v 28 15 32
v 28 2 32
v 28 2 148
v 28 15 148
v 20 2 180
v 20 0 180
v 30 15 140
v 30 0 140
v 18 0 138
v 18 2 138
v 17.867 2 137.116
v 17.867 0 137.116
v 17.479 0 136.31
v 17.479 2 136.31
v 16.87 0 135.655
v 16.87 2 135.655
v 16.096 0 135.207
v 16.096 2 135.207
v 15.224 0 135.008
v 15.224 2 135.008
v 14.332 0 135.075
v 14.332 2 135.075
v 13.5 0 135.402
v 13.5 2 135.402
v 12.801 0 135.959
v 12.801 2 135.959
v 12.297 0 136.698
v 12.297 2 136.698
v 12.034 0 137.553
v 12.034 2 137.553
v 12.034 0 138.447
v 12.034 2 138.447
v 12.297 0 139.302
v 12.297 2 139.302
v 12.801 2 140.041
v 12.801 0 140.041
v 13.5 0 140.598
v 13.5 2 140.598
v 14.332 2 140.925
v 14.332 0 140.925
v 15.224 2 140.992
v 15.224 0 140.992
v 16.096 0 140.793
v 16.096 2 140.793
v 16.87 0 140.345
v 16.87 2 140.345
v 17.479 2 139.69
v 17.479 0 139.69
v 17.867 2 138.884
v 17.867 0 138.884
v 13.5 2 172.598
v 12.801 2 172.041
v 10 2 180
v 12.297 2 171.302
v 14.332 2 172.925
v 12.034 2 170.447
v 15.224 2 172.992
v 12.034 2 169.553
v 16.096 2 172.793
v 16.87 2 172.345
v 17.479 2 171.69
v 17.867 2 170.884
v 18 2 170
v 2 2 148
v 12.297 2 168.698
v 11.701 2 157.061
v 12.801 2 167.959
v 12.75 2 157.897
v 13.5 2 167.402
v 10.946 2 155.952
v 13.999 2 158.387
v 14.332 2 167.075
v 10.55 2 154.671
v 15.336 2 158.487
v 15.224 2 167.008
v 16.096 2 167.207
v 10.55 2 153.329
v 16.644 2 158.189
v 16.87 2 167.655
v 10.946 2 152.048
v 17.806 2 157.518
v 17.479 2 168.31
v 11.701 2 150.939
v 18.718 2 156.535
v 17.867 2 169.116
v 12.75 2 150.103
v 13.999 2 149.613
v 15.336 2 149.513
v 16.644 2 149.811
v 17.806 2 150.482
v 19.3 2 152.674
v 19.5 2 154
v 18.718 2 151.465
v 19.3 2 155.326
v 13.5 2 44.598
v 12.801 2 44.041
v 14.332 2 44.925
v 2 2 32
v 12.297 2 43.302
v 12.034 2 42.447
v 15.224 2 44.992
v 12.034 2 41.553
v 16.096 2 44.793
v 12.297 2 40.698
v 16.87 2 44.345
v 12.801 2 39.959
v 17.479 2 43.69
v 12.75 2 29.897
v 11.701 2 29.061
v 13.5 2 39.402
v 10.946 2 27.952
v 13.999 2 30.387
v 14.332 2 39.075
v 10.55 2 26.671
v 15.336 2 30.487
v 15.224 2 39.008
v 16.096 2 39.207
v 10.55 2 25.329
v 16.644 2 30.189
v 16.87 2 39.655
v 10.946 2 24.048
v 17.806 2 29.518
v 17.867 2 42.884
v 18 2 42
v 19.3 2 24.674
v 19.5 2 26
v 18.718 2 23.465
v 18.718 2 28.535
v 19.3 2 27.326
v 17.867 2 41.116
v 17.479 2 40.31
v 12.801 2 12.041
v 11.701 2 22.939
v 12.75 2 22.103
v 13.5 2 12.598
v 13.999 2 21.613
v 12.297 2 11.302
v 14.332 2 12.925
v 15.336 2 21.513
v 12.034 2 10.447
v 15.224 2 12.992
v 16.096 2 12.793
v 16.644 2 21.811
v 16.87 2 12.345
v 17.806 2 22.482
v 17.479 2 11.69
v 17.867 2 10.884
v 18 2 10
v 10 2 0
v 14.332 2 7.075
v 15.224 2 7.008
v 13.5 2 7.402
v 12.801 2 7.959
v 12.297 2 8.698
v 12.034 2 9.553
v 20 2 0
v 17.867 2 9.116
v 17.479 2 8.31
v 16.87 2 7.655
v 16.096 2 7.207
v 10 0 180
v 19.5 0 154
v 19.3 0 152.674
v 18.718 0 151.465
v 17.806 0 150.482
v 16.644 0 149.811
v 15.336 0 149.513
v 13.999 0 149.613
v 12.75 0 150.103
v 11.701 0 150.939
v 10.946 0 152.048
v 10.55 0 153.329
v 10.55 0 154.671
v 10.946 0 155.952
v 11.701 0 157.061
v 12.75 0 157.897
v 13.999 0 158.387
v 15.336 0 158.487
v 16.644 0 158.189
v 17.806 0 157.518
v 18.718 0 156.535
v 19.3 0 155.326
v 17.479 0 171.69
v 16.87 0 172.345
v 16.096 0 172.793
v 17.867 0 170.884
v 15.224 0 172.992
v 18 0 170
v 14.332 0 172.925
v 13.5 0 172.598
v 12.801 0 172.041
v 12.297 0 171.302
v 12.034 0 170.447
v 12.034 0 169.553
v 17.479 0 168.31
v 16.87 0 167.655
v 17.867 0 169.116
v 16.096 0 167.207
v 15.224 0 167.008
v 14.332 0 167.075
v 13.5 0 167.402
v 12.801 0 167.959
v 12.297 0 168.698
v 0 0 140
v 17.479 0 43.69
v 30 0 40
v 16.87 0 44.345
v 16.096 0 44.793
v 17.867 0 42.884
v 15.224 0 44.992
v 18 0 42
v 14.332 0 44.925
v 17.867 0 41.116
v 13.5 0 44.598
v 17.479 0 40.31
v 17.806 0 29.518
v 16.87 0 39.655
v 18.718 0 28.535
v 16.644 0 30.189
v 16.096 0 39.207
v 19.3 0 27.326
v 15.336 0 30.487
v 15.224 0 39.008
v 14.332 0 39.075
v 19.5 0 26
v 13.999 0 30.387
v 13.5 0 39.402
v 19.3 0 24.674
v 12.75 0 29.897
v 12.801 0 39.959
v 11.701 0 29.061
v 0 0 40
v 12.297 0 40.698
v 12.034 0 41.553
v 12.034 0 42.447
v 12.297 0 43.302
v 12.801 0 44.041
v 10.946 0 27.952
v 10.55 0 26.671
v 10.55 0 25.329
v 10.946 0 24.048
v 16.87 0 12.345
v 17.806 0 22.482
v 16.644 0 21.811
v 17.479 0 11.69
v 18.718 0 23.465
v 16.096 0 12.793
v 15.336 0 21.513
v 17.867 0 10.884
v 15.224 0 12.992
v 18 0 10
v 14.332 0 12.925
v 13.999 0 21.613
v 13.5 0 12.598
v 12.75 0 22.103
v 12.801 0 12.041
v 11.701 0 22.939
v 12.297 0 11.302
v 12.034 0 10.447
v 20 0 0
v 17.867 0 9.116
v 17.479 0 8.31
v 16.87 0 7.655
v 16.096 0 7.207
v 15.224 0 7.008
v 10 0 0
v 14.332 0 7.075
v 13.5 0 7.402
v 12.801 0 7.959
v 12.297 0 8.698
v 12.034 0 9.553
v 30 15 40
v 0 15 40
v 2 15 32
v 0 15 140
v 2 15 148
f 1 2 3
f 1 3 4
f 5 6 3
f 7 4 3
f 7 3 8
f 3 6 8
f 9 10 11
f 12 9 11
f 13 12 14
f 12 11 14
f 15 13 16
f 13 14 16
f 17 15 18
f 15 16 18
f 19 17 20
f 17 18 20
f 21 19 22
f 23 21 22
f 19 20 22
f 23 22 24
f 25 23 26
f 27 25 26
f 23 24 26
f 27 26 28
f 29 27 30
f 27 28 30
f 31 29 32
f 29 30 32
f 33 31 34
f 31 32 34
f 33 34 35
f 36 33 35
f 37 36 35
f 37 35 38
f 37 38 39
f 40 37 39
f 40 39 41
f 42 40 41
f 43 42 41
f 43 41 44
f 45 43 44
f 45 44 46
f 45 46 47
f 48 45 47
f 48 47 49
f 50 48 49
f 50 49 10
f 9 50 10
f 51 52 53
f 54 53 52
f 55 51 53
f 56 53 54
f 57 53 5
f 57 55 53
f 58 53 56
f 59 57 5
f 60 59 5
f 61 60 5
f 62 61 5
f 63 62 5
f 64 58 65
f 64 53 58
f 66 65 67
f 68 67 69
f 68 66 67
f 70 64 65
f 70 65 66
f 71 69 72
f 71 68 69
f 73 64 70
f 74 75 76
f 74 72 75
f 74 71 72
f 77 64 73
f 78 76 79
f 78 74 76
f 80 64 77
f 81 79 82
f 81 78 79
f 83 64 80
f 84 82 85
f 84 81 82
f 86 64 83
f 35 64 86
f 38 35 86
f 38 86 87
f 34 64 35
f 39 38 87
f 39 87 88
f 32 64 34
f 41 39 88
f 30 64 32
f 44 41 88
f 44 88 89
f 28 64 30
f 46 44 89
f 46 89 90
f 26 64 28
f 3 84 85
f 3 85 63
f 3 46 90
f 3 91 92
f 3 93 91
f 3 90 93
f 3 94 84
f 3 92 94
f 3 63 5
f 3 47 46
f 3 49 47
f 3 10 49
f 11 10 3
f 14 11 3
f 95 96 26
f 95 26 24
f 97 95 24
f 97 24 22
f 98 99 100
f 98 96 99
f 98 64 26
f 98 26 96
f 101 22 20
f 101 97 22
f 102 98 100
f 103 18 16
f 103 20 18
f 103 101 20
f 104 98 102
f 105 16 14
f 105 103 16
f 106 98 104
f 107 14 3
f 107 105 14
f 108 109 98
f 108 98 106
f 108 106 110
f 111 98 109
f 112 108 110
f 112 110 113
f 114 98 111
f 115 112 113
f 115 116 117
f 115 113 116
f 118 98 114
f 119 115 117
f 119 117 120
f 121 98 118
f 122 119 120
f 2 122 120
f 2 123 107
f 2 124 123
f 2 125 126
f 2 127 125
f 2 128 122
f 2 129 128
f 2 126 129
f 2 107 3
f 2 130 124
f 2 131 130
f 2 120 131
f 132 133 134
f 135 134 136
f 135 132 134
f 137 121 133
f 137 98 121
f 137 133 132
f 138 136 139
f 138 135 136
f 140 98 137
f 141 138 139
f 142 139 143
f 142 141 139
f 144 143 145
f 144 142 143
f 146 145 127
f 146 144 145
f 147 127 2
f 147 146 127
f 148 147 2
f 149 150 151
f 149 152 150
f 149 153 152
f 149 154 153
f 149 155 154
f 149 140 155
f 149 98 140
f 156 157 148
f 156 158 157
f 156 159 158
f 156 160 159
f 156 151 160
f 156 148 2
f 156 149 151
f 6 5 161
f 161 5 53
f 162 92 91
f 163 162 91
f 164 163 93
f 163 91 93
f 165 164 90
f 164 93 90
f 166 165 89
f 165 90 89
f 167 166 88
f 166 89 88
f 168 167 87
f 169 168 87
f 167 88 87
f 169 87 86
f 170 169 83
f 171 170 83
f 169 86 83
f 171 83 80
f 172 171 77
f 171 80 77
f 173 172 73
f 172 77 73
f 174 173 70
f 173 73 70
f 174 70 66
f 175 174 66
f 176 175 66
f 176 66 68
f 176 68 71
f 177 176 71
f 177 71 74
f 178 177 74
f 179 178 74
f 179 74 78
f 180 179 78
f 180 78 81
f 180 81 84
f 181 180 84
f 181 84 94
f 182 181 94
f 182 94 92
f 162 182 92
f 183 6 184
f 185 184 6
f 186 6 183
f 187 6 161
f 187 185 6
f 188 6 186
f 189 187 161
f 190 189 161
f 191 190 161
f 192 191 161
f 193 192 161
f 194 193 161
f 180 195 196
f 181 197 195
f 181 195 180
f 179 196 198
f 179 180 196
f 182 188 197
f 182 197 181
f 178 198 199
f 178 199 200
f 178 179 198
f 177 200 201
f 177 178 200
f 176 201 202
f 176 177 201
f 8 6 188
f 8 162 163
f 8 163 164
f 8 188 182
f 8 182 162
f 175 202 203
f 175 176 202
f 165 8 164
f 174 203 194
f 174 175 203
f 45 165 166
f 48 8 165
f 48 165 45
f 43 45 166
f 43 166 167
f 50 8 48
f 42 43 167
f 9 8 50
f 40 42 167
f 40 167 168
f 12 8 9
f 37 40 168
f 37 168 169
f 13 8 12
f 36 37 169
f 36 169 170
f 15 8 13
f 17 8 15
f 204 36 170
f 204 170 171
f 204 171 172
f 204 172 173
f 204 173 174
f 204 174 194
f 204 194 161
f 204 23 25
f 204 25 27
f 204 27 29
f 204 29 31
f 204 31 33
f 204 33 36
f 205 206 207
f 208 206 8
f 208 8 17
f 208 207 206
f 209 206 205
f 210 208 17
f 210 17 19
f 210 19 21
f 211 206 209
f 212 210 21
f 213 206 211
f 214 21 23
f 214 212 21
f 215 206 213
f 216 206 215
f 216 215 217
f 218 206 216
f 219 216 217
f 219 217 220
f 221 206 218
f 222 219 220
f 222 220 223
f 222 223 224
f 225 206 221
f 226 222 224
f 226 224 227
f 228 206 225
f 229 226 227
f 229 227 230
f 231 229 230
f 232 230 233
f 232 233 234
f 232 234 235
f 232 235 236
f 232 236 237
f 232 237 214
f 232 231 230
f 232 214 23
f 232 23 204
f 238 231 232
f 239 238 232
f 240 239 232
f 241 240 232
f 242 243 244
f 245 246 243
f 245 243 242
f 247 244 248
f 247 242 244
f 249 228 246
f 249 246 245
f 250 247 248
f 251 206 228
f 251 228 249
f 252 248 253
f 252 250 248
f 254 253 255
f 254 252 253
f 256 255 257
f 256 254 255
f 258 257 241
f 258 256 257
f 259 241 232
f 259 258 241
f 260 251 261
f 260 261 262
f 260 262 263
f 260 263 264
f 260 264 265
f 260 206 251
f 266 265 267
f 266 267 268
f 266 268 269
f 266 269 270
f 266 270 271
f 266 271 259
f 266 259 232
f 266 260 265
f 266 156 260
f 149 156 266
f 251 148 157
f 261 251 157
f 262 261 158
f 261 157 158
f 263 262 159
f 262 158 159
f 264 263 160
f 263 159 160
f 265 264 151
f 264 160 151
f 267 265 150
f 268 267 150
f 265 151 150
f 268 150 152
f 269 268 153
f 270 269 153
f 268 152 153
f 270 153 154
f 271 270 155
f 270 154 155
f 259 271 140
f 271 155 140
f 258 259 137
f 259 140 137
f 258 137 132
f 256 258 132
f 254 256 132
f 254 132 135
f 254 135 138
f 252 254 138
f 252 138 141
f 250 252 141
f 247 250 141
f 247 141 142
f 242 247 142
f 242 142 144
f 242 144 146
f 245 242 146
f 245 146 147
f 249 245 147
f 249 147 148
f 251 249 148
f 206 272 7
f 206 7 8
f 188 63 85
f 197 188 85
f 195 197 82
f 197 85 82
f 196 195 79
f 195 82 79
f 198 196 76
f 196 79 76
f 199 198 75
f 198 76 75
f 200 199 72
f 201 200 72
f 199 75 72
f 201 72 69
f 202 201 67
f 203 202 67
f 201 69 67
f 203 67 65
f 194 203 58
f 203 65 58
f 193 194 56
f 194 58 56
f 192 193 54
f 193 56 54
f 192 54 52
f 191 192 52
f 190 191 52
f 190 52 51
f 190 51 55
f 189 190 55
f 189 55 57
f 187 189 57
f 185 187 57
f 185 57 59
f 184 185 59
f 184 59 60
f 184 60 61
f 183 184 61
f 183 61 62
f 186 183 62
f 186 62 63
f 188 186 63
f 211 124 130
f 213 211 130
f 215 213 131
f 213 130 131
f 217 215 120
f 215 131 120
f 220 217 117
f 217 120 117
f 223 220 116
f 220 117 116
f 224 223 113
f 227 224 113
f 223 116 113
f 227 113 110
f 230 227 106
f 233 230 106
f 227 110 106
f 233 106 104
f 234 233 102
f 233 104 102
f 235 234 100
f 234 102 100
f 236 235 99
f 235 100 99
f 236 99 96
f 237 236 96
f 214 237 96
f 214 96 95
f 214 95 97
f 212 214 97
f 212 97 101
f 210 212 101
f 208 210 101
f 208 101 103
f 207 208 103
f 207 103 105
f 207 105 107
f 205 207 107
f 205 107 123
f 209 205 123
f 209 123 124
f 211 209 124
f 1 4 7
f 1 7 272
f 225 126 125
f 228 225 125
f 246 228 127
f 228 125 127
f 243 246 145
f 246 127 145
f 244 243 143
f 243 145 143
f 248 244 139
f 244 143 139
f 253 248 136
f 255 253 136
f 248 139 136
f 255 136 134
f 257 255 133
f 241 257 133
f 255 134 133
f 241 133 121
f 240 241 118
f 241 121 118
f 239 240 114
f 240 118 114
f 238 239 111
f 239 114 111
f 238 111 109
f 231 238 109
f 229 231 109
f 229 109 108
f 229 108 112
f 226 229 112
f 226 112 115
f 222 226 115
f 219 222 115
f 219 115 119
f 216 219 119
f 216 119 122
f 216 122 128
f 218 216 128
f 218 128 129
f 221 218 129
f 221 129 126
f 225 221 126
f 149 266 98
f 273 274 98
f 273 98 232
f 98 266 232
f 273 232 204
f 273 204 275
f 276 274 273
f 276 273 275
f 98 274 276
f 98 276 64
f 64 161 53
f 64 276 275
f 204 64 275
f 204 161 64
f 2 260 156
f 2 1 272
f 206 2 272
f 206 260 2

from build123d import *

# Parameters (mm, degrees)
P_IDAT_VYSUNUT_M1_DEPTH  = 180
ODEBRAT_VYSUNUT_M1_REACH = 4
SKICA2_R                 = 3
SKICA2_R_2               = 4.5
ODEBRAT_VYSUNUT_M2_DEPTH = 15


with BuildPart() as part:
    # Skica1 → Přidat vysunutím1 (new body)
    with BuildSketch(Plane.XY):
        Polygon((28, 15), (30, 15), (30, 0), (0, 0), (0, 15), (2, 15), (2, 2), (28, 2), align=None)
    extrude(amount=P_IDAT_VYSUNUT_M1_DEPTH)

    # Skica2 → Odebrat vysunutím1 (cut, up to next)
    with BuildSketch(Plane(origin=(0, 2, 0), x_dir=(1, 0, 0), z_dir=(0, 1, 0)), mode=Mode.PRIVATE) as odebrat_vysunut_m1_sk1:
        with Locations((15, -170)):
            Circle(SKICA2_R)
    odebrat_vysunut_m1_tool1 = extrude(odebrat_vysunut_m1_sk1.sketch, amount=-ODEBRAT_VYSUNUT_M1_REACH, mode=Mode.PRIVATE) & part.part
    add(odebrat_vysunut_m1_tool1.solids().sort_by_distance((15, 2, 170))[0], mode=Mode.SUBTRACT)
    # Skica2 → Odebrat vysunutím1 (cut, up to next)
    with BuildSketch(Plane(origin=(0, 2, 0), x_dir=(1, 0, 0), z_dir=(0, 1, 0)), mode=Mode.PRIVATE) as odebrat_vysunut_m1_sk2:
        with Locations((15, -154)):
            Circle(SKICA2_R_2)
    odebrat_vysunut_m1_tool2 = extrude(odebrat_vysunut_m1_sk2.sketch, amount=-ODEBRAT_VYSUNUT_M1_REACH, mode=Mode.PRIVATE) & part.part
    add(odebrat_vysunut_m1_tool2.solids().sort_by_distance((15, 2, 154))[0], mode=Mode.SUBTRACT)
    # Skica2 → Odebrat vysunutím1 (cut, up to next)
    with BuildSketch(Plane(origin=(0, 2, 0), x_dir=(1, 0, 0), z_dir=(0, 1, 0)), mode=Mode.PRIVATE) as odebrat_vysunut_m1_sk3:
        with Locations((15, -138)):
            Circle(SKICA2_R)
    odebrat_vysunut_m1_tool3 = extrude(odebrat_vysunut_m1_sk3.sketch, amount=-ODEBRAT_VYSUNUT_M1_REACH, mode=Mode.PRIVATE) & part.part
    add(odebrat_vysunut_m1_tool3.solids().sort_by_distance((15, 2, 138))[0], mode=Mode.SUBTRACT)
    # Skica2 → Odebrat vysunutím1 (cut, up to next)
    with BuildSketch(Plane(origin=(0, 2, 0), x_dir=(1, 0, 0), z_dir=(0, 1, 0)), mode=Mode.PRIVATE) as odebrat_vysunut_m1_sk4:
        with Locations((15, -42)):
            Circle(SKICA2_R)
    odebrat_vysunut_m1_tool4 = extrude(odebrat_vysunut_m1_sk4.sketch, amount=-ODEBRAT_VYSUNUT_M1_REACH, mode=Mode.PRIVATE) & part.part
    add(odebrat_vysunut_m1_tool4.solids().sort_by_distance((15, 2, 42))[0], mode=Mode.SUBTRACT)
    # Skica2 → Odebrat vysunutím1 (cut, up to next)
    with BuildSketch(Plane(origin=(0, 2, 0), x_dir=(1, 0, 0), z_dir=(0, 1, 0)), mode=Mode.PRIVATE) as odebrat_vysunut_m1_sk5:
        with Locations((15, -26)):
            Circle(SKICA2_R_2)
    odebrat_vysunut_m1_tool5 = extrude(odebrat_vysunut_m1_sk5.sketch, amount=-ODEBRAT_VYSUNUT_M1_REACH, mode=Mode.PRIVATE) & part.part
    add(odebrat_vysunut_m1_tool5.solids().sort_by_distance((15, 2, 26))[0], mode=Mode.SUBTRACT)
    # Skica2 → Odebrat vysunutím1 (cut, up to next)
    with BuildSketch(Plane(origin=(0, 2, 0), x_dir=(1, 0, 0), z_dir=(0, 1, 0)), mode=Mode.PRIVATE) as odebrat_vysunut_m1_sk6:
        with Locations((15, -10)):
            Circle(SKICA2_R)
    odebrat_vysunut_m1_tool6 = extrude(odebrat_vysunut_m1_sk6.sketch, amount=-ODEBRAT_VYSUNUT_M1_REACH, mode=Mode.PRIVATE) & part.part
    add(odebrat_vysunut_m1_tool6.solids().sort_by_distance((15, 2, 10))[0], mode=Mode.SUBTRACT)

    # Skica3 → Odebrat vysunutím2 (cut)
    with BuildSketch(Plane.XZ):
        Polygon((30, 180), (20, 180), (30, 140), align=None)
        Polygon((0, 0), (10, 0), (0, 40), align=None)
        Polygon((10, 180), (0, 140), (0, 180), align=None)
        Polygon((20, 0), (30, 40), (30, 0), align=None)
    extrude(amount=-ODEBRAT_VYSUNUT_M2_DEPTH, mode=Mode.SUBTRACT)


solid = part.part
